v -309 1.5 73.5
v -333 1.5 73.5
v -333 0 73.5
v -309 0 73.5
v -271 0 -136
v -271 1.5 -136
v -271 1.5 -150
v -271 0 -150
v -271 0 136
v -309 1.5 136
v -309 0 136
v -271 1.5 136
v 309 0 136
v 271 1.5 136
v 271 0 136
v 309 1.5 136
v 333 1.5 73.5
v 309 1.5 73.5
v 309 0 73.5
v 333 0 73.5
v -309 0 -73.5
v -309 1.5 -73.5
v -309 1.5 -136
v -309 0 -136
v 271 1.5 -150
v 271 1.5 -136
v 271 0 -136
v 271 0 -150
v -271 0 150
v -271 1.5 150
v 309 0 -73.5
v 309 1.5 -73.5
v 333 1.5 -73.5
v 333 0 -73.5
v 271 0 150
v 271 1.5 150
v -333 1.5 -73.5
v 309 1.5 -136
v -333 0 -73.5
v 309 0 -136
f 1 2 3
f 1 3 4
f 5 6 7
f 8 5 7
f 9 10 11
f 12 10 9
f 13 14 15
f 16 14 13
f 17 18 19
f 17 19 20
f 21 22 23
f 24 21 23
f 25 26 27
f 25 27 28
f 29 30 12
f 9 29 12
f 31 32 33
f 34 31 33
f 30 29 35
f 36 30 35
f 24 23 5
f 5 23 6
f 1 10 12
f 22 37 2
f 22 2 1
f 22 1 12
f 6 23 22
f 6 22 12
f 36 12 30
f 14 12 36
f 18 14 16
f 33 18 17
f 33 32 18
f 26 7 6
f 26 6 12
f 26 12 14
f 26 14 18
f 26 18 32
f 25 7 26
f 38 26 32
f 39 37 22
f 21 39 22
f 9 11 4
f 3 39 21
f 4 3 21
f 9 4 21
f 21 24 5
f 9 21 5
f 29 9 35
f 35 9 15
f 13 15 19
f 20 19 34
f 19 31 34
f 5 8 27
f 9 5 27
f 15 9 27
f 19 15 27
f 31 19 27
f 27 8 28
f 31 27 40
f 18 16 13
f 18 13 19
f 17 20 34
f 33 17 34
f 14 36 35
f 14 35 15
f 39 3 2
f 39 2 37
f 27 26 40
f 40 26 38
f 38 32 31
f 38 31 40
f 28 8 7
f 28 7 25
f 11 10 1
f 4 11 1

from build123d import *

# Parameters (mm, degrees)
CROQUIS1_W              = 666
CROQUIS1_H              = 300
SALIENTE_EXTRUIR1_DEPTH = 1.5
CROQUIS2_W              = 24
CROQUIS2_H              = 46.5
CORTAR_EXTRUIR1_DEPTH   = 2.5
CROQUIS3_W              = 38
CROQUIS3_H              = 14
CORTAR_EXTRUIR2_DEPTH   = 2.5
CROQUIS5_W              = 24
CROQUIS5_H              = 30
CORTAR_EXTRUIR3_DEPTH   = 2.5


with BuildPart() as part:
    # Croquis1 → Saliente-Extruir1 (new body)
    with BuildSketch(Plane(origin=(0, 0, 0), x_dir=(1, 0, 0), z_dir=(0, 1, 0))):
        Rectangle(CROQUIS1_W, CROQUIS1_H)
    extrude(amount=SALIENTE_EXTRUIR1_DEPTH)

    # Croquis2 → Cortar-Extruir1 (cut, through all)
    with BuildSketch(Plane(origin=(0, 1.5, 0), x_dir=(1, 0, 0), z_dir=(0, 1, 0))):
        with Locations((321, 126.75)):
            Rectangle(CROQUIS2_W, CROQUIS2_H)
        with Locations((-321, 126.75)):
            Rectangle(CROQUIS2_W, CROQUIS2_H)
        with Locations((-321, -126.75)):
            Rectangle(CROQUIS2_W, CROQUIS2_H)
        with Locations((321, -126.75)):
            Rectangle(CROQUIS2_W, CROQUIS2_H)
    extrude(amount=-CORTAR_EXTRUIR1_DEPTH, mode=Mode.SUBTRACT)

    # Croquis3 → Cortar-Extruir2 (cut, through all)
    with BuildSketch(Plane(origin=(0, 1.5, 0), x_dir=(1, 0, 0), z_dir=(0, 1, 0))):
        with Locations((-290, 143)):
            Rectangle(CROQUIS3_W, CROQUIS3_H)
        with Locations((290, 143)):
            Rectangle(CROQUIS3_W, CROQUIS3_H)
        with Locations((290, -143)):
            Rectangle(CROQUIS3_W, CROQUIS3_H)
        with Locations((-290, -143)):
            Rectangle(CROQUIS3_W, CROQUIS3_H)
    extrude(amount=-CORTAR_EXTRUIR2_DEPTH, mode=Mode.SUBTRACT)

    # Croquis5 → Cortar-Extruir3 (cut, through all)
    with BuildSketch(Plane(origin=(0, 1.5, 0), x_dir=(1, 0, 0), z_dir=(0, 1, 0))):
        with Locations((-321, 88.5)):
            Rectangle(CROQUIS5_W, CROQUIS5_H)
        with Locations((321, 88.5)):
            Rectangle(CROQUIS5_W, CROQUIS5_H)
        with Locations((321, -88.5)):
            Rectangle(CROQUIS5_W, CROQUIS5_H)
        with Locations((-321, -88.5)):
            Rectangle(CROQUIS5_W, CROQUIS5_H)
    extrude(amount=-CORTAR_EXTRUIR3_DEPTH, mode=Mode.SUBTRACT)


solid = part.part
